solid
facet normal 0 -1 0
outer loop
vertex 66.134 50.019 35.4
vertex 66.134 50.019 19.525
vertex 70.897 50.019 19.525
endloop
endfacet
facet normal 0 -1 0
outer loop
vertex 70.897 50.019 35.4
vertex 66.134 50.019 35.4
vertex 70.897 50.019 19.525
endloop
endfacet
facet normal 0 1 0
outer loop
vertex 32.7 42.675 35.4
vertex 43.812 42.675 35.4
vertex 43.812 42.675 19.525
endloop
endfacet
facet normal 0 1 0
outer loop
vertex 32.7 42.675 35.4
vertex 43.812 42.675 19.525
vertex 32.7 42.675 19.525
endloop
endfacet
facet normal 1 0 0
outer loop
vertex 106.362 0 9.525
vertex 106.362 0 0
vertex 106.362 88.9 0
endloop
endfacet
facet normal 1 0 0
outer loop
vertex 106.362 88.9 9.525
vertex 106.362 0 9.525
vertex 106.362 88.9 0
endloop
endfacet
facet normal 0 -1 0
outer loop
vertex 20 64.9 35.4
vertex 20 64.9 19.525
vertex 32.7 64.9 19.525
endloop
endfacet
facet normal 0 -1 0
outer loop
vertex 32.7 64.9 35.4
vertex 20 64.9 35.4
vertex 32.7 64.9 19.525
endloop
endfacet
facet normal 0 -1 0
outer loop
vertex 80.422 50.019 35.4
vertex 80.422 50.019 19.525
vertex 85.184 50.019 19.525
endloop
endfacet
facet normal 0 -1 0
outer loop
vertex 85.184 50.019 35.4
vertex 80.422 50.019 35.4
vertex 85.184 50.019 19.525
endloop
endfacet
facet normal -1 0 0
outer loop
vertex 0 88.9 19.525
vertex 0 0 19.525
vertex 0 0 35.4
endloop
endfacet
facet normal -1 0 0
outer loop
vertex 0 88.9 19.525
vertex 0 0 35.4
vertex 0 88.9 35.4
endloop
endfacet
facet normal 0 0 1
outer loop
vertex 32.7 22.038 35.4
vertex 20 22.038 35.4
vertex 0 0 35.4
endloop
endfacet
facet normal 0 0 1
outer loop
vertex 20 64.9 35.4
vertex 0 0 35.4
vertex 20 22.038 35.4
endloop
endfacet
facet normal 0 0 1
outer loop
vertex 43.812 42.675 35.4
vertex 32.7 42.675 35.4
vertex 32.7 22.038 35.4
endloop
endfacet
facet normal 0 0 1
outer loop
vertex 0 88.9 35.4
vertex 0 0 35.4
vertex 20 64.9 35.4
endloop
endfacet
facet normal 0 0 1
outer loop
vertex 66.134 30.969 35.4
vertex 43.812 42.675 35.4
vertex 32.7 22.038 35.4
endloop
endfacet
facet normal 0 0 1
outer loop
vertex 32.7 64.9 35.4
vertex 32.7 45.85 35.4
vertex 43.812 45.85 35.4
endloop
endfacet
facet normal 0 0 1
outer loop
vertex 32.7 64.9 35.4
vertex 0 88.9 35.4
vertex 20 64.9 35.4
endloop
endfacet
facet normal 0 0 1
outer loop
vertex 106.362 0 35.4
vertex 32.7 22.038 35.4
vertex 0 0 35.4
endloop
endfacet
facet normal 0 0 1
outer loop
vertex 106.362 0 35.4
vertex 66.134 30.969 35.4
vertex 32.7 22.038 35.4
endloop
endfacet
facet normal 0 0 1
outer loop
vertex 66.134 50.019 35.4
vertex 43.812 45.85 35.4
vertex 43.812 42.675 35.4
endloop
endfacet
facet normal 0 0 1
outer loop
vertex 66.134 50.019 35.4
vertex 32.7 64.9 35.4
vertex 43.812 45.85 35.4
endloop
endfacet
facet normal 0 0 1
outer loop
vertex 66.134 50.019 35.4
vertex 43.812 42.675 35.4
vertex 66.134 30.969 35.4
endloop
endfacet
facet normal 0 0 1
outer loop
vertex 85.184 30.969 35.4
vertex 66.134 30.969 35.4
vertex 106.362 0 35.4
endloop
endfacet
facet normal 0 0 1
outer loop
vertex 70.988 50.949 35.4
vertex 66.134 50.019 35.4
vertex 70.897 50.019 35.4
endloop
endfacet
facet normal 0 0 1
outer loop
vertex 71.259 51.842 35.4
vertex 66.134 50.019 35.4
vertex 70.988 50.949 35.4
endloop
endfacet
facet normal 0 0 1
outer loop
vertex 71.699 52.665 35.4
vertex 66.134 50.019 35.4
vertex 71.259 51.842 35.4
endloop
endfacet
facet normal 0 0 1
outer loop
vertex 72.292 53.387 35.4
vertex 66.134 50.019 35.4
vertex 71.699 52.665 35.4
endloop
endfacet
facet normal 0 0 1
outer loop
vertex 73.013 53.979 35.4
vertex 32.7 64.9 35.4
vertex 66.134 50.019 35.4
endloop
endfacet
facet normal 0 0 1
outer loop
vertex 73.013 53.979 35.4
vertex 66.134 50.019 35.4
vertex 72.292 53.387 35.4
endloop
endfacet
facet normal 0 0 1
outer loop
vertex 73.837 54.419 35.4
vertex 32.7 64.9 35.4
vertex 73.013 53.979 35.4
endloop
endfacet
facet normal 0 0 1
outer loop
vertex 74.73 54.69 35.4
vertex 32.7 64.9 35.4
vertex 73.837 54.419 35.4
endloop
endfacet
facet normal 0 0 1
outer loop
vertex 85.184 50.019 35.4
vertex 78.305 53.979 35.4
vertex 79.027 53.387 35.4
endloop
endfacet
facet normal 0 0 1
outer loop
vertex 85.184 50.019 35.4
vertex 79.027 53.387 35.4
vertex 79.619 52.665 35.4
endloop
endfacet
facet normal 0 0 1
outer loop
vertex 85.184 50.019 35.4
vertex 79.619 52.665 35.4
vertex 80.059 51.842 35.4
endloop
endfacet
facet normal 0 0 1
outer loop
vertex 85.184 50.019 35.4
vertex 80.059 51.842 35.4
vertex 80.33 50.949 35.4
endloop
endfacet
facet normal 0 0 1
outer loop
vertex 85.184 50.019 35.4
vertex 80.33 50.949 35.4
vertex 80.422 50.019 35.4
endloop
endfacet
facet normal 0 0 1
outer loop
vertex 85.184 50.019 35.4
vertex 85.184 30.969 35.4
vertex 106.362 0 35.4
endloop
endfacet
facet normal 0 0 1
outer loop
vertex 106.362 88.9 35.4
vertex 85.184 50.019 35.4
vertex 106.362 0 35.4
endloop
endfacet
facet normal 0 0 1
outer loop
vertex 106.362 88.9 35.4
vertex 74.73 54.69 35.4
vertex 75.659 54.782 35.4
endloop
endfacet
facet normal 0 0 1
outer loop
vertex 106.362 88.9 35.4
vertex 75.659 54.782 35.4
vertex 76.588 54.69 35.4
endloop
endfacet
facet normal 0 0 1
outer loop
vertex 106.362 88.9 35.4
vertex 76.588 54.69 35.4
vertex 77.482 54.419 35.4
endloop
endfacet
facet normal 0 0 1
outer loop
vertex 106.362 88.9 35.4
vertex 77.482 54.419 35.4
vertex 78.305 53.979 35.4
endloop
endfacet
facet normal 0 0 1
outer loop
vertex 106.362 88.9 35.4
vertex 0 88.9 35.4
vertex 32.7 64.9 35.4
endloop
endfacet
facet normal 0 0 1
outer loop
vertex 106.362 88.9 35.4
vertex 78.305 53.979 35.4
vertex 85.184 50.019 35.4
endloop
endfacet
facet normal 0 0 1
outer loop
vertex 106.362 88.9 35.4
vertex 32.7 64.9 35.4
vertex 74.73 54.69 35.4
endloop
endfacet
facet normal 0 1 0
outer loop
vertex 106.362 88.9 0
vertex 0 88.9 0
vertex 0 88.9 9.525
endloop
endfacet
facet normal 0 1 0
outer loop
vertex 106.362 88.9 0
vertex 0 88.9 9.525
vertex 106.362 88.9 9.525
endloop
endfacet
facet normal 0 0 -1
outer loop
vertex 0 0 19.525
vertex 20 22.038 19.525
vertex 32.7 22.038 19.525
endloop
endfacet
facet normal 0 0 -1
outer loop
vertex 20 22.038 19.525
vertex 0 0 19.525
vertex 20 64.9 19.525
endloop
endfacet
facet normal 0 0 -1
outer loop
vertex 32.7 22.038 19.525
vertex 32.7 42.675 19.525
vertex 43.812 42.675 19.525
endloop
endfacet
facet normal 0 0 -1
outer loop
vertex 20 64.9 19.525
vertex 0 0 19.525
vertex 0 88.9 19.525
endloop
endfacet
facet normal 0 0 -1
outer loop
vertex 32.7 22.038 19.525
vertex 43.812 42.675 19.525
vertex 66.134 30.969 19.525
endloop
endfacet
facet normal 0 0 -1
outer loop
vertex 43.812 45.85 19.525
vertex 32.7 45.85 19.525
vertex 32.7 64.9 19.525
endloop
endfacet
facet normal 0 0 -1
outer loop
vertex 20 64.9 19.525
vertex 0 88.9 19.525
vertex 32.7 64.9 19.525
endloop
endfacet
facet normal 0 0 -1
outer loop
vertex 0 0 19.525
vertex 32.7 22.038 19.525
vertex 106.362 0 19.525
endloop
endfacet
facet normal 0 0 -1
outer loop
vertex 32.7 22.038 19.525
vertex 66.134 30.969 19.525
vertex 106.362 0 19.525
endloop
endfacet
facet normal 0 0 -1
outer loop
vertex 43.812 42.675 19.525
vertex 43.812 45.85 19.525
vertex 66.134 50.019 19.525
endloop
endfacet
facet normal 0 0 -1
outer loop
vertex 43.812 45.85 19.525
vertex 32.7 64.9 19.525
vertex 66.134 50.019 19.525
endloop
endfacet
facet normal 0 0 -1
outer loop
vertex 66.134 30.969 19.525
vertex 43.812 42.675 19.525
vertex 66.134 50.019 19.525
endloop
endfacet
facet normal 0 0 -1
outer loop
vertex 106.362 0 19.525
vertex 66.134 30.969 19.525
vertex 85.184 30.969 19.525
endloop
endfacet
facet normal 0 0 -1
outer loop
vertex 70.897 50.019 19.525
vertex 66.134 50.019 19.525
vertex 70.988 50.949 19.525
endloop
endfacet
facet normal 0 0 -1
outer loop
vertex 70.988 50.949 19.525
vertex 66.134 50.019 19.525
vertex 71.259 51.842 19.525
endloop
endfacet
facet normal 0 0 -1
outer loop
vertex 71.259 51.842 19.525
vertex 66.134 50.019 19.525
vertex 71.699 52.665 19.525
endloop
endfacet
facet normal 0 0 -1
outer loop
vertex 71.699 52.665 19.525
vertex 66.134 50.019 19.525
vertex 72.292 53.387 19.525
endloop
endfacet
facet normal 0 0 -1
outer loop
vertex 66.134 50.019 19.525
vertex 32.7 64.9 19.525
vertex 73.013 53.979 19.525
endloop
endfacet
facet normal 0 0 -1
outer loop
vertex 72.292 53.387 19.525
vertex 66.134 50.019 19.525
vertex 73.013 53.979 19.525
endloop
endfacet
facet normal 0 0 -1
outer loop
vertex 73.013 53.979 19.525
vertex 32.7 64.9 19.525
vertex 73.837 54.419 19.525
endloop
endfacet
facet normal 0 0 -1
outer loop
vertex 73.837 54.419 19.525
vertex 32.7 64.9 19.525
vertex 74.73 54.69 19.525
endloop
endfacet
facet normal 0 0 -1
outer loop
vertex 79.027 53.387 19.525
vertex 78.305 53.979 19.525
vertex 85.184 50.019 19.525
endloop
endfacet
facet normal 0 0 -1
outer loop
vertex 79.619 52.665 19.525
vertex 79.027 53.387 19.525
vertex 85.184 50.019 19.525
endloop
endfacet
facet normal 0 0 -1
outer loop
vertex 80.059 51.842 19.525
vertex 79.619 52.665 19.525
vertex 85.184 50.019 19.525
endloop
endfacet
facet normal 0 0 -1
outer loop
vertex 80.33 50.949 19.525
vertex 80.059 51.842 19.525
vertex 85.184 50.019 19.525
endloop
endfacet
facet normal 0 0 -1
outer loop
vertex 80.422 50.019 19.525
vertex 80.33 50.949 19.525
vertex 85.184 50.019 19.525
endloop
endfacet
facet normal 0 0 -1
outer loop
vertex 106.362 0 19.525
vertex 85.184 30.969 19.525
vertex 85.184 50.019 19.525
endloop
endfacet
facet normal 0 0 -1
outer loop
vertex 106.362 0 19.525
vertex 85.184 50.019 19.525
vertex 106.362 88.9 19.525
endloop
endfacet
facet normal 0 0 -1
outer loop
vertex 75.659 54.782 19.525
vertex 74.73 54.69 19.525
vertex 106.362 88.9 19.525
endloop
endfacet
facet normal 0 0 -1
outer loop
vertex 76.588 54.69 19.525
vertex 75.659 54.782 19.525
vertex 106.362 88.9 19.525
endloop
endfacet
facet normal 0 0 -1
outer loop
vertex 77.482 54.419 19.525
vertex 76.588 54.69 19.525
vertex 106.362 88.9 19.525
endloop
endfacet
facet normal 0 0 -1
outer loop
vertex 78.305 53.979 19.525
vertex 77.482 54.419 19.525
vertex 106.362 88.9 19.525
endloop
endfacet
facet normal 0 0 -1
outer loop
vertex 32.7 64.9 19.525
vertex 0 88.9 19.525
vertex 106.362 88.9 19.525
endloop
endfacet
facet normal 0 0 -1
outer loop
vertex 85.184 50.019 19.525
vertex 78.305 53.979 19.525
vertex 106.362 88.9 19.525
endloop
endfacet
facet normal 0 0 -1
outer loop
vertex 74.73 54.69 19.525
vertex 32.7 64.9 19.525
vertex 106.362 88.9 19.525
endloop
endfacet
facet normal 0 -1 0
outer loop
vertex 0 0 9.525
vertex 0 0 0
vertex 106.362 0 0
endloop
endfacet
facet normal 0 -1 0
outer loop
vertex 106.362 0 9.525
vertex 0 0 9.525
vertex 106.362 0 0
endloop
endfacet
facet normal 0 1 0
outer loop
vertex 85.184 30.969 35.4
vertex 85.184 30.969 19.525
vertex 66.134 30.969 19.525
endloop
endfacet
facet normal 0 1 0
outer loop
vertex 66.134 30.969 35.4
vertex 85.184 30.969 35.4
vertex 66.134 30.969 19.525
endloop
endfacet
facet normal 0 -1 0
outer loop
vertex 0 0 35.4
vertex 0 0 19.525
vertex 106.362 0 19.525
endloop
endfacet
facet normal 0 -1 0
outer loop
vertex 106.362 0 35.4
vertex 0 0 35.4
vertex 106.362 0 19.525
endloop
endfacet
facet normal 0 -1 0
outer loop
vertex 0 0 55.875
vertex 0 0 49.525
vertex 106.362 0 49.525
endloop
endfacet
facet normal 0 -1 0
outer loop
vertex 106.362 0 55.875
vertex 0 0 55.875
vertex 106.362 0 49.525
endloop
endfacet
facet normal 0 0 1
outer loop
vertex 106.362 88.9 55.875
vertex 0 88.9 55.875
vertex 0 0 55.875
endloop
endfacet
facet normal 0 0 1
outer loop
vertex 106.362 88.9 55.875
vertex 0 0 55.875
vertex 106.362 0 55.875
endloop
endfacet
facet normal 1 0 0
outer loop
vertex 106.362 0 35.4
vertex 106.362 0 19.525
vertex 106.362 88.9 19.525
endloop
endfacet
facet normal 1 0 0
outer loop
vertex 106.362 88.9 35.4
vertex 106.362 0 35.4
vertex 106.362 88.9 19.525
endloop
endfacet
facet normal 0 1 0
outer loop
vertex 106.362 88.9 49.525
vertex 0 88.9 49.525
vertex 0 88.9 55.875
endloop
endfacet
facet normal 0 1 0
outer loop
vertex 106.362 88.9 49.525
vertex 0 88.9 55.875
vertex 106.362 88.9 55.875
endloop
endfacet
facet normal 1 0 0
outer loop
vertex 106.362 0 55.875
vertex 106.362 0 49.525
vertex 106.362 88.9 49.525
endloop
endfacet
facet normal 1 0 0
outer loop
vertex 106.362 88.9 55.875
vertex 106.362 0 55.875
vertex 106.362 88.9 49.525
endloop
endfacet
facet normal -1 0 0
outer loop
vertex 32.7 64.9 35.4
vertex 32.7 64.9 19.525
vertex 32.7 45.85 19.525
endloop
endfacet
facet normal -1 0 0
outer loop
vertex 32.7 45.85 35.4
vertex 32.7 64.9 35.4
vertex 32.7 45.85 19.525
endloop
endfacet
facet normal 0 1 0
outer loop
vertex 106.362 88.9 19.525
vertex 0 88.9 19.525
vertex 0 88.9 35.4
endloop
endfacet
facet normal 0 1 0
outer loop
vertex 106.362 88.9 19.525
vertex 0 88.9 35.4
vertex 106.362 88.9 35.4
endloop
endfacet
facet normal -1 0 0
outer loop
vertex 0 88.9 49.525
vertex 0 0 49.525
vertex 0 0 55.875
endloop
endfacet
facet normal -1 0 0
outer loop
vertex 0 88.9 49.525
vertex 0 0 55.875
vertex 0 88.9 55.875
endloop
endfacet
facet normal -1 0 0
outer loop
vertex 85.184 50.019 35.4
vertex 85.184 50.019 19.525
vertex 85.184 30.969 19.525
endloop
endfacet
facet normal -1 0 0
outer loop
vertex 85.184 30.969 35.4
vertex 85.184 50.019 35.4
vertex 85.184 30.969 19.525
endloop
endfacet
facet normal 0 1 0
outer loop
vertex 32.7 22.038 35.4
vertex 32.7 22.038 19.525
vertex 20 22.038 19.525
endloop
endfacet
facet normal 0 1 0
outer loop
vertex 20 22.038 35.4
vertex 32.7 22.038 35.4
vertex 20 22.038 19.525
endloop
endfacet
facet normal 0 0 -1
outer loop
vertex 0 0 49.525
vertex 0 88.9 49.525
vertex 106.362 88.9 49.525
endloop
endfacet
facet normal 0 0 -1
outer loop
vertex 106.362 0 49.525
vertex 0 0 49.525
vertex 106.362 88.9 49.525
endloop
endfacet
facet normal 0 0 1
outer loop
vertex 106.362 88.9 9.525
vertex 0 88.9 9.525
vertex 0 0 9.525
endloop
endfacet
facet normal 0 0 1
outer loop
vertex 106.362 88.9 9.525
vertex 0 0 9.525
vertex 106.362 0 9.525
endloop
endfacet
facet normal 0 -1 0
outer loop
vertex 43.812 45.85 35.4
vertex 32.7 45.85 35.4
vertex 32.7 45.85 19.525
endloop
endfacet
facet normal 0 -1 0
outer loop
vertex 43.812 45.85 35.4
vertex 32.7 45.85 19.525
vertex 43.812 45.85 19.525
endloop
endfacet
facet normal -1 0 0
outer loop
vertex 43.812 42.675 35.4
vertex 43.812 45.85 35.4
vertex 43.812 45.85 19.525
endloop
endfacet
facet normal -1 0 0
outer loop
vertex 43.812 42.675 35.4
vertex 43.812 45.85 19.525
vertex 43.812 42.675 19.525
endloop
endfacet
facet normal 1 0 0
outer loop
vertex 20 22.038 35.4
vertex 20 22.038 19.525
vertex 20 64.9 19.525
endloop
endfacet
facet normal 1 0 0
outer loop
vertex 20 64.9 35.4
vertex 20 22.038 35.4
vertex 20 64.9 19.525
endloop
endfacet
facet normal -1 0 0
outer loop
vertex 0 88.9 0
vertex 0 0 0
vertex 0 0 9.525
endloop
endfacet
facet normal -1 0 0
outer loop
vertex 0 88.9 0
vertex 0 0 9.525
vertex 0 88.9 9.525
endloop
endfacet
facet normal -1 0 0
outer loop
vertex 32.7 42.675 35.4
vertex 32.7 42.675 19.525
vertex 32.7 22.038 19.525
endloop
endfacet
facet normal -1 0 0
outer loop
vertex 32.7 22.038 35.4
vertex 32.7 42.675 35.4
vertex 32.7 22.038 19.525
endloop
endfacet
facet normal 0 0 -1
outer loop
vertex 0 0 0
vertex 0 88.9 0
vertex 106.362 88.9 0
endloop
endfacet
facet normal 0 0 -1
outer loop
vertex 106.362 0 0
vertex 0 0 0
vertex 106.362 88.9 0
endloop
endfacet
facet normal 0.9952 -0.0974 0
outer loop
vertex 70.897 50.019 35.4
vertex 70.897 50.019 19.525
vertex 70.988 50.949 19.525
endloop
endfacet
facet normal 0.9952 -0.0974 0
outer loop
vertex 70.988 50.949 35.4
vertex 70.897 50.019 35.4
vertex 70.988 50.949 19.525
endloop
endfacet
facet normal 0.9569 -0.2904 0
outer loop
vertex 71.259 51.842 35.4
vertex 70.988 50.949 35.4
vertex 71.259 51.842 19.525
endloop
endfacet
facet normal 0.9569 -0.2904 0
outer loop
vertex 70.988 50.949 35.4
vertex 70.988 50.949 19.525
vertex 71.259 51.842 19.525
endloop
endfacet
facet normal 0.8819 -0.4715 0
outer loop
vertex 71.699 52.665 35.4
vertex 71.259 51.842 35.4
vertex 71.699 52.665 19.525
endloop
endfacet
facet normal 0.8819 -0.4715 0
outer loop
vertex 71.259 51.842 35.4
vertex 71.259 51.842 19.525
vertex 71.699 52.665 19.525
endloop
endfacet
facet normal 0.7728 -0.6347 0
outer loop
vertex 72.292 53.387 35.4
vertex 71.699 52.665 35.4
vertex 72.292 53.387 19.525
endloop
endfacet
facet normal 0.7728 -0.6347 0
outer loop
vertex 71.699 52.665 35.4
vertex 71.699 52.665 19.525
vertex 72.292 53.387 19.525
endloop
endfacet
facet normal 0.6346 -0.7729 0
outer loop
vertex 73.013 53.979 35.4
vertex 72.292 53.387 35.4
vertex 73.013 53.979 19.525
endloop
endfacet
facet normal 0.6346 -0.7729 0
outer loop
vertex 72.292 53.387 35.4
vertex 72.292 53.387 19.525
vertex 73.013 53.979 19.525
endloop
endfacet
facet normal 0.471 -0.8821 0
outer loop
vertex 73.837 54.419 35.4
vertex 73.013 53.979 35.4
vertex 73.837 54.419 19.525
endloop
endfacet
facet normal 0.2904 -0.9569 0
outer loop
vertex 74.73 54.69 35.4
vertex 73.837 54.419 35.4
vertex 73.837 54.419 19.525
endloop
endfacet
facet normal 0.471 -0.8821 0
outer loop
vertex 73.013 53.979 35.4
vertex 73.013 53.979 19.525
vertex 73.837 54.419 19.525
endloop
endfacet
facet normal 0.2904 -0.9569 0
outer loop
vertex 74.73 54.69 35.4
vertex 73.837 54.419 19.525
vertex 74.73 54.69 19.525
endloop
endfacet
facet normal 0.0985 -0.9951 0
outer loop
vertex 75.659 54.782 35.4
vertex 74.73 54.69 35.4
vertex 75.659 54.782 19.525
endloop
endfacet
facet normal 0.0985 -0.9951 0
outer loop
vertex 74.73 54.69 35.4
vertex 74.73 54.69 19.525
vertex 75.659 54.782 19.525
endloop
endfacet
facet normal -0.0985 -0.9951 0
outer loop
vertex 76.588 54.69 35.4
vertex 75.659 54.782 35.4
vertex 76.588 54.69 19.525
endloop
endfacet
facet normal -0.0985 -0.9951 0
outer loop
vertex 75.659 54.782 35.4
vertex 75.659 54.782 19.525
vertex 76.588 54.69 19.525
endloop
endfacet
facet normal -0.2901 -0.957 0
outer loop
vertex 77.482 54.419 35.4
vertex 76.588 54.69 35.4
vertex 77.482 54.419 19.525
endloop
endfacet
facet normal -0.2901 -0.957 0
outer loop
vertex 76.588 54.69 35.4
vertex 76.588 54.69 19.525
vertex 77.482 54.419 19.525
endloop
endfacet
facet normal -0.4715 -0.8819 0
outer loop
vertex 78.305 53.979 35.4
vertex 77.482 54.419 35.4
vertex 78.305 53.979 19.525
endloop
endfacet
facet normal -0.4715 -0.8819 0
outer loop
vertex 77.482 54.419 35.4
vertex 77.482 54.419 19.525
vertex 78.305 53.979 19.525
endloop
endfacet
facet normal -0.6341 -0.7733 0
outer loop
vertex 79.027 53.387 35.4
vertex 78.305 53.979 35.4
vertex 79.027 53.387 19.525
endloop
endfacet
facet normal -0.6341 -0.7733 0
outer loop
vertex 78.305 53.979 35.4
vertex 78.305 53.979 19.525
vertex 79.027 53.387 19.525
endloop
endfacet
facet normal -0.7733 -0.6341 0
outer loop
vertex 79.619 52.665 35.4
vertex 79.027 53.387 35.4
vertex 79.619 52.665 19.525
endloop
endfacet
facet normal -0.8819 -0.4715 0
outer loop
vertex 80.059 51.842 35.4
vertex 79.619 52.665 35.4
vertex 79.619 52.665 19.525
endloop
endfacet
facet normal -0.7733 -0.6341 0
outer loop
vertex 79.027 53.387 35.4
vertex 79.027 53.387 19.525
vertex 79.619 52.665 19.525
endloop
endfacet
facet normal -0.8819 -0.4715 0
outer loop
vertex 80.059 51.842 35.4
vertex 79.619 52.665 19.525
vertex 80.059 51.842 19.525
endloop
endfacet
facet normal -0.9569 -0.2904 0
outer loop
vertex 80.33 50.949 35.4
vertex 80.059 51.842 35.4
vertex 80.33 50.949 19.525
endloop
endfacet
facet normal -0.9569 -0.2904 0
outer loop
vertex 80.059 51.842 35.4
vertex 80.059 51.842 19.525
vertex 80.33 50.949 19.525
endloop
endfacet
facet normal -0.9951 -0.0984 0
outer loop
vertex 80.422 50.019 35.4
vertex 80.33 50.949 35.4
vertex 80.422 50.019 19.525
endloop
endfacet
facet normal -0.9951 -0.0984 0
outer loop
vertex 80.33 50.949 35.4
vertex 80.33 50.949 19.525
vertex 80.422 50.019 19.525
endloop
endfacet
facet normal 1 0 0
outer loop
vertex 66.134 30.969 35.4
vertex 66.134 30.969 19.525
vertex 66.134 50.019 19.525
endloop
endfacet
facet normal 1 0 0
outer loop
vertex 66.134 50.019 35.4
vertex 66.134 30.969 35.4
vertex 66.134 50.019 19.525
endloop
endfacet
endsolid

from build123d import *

# Parameters (mm, degrees)
F0_W     = 106.3625
F0_H     = 88.9
F1_DEPTH = 9.525
F3_W     = 106.3625
F3_H     = 88.9
F4_DEPTH = 15.875
F6_W     = 106.3625
F6_H     = 88.9
F7_DEPTH = 6.35


with BuildPart() as f1:
    # F0 (on Top) → F1 (new body)
    with BuildSketch(Plane.XY):
        with Locations((53.18125, 44.45)):
            Rectangle(F0_W, F0_H)
    extrude(amount=F1_DEPTH)


with BuildPart() as f4:
    # F3 (on offset) → F4 (new body)
    with BuildSketch(Plane.XY.offset(19.525)):
        with Locations((53.18125, 44.45)):
            Rectangle(F3_W, F3_H)
        Polygon((20, 22.0375), (20, 64.9), (32.7, 64.9), (32.7, 45.85), (43.8125, 45.85), (43.8125, 42.675), (32.7, 42.675), (32.7, 22.0375), align=None, mode=Mode.SUBTRACT)
        with BuildLine():
            ThreePointArc((70.8966249943, 50.0194092721), (75.6591249943, 54.7819092721), (80.4216249943, 50.0194092721))
            Line((80.4216249943, 50.0194092721), (85.1841249943, 50.0194092721))
            Line((85.1841249943, 50.0194092721), (85.1841249943, 30.9694092721))
            Line((85.1841249943, 30.9694092721), (66.1341249943, 30.9694092721))
            Line((66.1341249943, 30.9694092721), (66.1341249943, 50.0194092721))
            Line((66.1341249943, 50.0194092721), (70.8966249943, 50.0194092721))
        make_face(mode=Mode.SUBTRACT)
    extrude(amount=F4_DEPTH)


with BuildPart() as f7:
    # F6 (on offset) → F7 (new body)
    with BuildSketch(Plane.XY.offset(49.525)):
        with Locations((53.18125, 44.45)):
            Rectangle(F6_W, F6_H)
    extrude(amount=F7_DEPTH)


solid = Compound([f1.part, f4.part, f7.part])
